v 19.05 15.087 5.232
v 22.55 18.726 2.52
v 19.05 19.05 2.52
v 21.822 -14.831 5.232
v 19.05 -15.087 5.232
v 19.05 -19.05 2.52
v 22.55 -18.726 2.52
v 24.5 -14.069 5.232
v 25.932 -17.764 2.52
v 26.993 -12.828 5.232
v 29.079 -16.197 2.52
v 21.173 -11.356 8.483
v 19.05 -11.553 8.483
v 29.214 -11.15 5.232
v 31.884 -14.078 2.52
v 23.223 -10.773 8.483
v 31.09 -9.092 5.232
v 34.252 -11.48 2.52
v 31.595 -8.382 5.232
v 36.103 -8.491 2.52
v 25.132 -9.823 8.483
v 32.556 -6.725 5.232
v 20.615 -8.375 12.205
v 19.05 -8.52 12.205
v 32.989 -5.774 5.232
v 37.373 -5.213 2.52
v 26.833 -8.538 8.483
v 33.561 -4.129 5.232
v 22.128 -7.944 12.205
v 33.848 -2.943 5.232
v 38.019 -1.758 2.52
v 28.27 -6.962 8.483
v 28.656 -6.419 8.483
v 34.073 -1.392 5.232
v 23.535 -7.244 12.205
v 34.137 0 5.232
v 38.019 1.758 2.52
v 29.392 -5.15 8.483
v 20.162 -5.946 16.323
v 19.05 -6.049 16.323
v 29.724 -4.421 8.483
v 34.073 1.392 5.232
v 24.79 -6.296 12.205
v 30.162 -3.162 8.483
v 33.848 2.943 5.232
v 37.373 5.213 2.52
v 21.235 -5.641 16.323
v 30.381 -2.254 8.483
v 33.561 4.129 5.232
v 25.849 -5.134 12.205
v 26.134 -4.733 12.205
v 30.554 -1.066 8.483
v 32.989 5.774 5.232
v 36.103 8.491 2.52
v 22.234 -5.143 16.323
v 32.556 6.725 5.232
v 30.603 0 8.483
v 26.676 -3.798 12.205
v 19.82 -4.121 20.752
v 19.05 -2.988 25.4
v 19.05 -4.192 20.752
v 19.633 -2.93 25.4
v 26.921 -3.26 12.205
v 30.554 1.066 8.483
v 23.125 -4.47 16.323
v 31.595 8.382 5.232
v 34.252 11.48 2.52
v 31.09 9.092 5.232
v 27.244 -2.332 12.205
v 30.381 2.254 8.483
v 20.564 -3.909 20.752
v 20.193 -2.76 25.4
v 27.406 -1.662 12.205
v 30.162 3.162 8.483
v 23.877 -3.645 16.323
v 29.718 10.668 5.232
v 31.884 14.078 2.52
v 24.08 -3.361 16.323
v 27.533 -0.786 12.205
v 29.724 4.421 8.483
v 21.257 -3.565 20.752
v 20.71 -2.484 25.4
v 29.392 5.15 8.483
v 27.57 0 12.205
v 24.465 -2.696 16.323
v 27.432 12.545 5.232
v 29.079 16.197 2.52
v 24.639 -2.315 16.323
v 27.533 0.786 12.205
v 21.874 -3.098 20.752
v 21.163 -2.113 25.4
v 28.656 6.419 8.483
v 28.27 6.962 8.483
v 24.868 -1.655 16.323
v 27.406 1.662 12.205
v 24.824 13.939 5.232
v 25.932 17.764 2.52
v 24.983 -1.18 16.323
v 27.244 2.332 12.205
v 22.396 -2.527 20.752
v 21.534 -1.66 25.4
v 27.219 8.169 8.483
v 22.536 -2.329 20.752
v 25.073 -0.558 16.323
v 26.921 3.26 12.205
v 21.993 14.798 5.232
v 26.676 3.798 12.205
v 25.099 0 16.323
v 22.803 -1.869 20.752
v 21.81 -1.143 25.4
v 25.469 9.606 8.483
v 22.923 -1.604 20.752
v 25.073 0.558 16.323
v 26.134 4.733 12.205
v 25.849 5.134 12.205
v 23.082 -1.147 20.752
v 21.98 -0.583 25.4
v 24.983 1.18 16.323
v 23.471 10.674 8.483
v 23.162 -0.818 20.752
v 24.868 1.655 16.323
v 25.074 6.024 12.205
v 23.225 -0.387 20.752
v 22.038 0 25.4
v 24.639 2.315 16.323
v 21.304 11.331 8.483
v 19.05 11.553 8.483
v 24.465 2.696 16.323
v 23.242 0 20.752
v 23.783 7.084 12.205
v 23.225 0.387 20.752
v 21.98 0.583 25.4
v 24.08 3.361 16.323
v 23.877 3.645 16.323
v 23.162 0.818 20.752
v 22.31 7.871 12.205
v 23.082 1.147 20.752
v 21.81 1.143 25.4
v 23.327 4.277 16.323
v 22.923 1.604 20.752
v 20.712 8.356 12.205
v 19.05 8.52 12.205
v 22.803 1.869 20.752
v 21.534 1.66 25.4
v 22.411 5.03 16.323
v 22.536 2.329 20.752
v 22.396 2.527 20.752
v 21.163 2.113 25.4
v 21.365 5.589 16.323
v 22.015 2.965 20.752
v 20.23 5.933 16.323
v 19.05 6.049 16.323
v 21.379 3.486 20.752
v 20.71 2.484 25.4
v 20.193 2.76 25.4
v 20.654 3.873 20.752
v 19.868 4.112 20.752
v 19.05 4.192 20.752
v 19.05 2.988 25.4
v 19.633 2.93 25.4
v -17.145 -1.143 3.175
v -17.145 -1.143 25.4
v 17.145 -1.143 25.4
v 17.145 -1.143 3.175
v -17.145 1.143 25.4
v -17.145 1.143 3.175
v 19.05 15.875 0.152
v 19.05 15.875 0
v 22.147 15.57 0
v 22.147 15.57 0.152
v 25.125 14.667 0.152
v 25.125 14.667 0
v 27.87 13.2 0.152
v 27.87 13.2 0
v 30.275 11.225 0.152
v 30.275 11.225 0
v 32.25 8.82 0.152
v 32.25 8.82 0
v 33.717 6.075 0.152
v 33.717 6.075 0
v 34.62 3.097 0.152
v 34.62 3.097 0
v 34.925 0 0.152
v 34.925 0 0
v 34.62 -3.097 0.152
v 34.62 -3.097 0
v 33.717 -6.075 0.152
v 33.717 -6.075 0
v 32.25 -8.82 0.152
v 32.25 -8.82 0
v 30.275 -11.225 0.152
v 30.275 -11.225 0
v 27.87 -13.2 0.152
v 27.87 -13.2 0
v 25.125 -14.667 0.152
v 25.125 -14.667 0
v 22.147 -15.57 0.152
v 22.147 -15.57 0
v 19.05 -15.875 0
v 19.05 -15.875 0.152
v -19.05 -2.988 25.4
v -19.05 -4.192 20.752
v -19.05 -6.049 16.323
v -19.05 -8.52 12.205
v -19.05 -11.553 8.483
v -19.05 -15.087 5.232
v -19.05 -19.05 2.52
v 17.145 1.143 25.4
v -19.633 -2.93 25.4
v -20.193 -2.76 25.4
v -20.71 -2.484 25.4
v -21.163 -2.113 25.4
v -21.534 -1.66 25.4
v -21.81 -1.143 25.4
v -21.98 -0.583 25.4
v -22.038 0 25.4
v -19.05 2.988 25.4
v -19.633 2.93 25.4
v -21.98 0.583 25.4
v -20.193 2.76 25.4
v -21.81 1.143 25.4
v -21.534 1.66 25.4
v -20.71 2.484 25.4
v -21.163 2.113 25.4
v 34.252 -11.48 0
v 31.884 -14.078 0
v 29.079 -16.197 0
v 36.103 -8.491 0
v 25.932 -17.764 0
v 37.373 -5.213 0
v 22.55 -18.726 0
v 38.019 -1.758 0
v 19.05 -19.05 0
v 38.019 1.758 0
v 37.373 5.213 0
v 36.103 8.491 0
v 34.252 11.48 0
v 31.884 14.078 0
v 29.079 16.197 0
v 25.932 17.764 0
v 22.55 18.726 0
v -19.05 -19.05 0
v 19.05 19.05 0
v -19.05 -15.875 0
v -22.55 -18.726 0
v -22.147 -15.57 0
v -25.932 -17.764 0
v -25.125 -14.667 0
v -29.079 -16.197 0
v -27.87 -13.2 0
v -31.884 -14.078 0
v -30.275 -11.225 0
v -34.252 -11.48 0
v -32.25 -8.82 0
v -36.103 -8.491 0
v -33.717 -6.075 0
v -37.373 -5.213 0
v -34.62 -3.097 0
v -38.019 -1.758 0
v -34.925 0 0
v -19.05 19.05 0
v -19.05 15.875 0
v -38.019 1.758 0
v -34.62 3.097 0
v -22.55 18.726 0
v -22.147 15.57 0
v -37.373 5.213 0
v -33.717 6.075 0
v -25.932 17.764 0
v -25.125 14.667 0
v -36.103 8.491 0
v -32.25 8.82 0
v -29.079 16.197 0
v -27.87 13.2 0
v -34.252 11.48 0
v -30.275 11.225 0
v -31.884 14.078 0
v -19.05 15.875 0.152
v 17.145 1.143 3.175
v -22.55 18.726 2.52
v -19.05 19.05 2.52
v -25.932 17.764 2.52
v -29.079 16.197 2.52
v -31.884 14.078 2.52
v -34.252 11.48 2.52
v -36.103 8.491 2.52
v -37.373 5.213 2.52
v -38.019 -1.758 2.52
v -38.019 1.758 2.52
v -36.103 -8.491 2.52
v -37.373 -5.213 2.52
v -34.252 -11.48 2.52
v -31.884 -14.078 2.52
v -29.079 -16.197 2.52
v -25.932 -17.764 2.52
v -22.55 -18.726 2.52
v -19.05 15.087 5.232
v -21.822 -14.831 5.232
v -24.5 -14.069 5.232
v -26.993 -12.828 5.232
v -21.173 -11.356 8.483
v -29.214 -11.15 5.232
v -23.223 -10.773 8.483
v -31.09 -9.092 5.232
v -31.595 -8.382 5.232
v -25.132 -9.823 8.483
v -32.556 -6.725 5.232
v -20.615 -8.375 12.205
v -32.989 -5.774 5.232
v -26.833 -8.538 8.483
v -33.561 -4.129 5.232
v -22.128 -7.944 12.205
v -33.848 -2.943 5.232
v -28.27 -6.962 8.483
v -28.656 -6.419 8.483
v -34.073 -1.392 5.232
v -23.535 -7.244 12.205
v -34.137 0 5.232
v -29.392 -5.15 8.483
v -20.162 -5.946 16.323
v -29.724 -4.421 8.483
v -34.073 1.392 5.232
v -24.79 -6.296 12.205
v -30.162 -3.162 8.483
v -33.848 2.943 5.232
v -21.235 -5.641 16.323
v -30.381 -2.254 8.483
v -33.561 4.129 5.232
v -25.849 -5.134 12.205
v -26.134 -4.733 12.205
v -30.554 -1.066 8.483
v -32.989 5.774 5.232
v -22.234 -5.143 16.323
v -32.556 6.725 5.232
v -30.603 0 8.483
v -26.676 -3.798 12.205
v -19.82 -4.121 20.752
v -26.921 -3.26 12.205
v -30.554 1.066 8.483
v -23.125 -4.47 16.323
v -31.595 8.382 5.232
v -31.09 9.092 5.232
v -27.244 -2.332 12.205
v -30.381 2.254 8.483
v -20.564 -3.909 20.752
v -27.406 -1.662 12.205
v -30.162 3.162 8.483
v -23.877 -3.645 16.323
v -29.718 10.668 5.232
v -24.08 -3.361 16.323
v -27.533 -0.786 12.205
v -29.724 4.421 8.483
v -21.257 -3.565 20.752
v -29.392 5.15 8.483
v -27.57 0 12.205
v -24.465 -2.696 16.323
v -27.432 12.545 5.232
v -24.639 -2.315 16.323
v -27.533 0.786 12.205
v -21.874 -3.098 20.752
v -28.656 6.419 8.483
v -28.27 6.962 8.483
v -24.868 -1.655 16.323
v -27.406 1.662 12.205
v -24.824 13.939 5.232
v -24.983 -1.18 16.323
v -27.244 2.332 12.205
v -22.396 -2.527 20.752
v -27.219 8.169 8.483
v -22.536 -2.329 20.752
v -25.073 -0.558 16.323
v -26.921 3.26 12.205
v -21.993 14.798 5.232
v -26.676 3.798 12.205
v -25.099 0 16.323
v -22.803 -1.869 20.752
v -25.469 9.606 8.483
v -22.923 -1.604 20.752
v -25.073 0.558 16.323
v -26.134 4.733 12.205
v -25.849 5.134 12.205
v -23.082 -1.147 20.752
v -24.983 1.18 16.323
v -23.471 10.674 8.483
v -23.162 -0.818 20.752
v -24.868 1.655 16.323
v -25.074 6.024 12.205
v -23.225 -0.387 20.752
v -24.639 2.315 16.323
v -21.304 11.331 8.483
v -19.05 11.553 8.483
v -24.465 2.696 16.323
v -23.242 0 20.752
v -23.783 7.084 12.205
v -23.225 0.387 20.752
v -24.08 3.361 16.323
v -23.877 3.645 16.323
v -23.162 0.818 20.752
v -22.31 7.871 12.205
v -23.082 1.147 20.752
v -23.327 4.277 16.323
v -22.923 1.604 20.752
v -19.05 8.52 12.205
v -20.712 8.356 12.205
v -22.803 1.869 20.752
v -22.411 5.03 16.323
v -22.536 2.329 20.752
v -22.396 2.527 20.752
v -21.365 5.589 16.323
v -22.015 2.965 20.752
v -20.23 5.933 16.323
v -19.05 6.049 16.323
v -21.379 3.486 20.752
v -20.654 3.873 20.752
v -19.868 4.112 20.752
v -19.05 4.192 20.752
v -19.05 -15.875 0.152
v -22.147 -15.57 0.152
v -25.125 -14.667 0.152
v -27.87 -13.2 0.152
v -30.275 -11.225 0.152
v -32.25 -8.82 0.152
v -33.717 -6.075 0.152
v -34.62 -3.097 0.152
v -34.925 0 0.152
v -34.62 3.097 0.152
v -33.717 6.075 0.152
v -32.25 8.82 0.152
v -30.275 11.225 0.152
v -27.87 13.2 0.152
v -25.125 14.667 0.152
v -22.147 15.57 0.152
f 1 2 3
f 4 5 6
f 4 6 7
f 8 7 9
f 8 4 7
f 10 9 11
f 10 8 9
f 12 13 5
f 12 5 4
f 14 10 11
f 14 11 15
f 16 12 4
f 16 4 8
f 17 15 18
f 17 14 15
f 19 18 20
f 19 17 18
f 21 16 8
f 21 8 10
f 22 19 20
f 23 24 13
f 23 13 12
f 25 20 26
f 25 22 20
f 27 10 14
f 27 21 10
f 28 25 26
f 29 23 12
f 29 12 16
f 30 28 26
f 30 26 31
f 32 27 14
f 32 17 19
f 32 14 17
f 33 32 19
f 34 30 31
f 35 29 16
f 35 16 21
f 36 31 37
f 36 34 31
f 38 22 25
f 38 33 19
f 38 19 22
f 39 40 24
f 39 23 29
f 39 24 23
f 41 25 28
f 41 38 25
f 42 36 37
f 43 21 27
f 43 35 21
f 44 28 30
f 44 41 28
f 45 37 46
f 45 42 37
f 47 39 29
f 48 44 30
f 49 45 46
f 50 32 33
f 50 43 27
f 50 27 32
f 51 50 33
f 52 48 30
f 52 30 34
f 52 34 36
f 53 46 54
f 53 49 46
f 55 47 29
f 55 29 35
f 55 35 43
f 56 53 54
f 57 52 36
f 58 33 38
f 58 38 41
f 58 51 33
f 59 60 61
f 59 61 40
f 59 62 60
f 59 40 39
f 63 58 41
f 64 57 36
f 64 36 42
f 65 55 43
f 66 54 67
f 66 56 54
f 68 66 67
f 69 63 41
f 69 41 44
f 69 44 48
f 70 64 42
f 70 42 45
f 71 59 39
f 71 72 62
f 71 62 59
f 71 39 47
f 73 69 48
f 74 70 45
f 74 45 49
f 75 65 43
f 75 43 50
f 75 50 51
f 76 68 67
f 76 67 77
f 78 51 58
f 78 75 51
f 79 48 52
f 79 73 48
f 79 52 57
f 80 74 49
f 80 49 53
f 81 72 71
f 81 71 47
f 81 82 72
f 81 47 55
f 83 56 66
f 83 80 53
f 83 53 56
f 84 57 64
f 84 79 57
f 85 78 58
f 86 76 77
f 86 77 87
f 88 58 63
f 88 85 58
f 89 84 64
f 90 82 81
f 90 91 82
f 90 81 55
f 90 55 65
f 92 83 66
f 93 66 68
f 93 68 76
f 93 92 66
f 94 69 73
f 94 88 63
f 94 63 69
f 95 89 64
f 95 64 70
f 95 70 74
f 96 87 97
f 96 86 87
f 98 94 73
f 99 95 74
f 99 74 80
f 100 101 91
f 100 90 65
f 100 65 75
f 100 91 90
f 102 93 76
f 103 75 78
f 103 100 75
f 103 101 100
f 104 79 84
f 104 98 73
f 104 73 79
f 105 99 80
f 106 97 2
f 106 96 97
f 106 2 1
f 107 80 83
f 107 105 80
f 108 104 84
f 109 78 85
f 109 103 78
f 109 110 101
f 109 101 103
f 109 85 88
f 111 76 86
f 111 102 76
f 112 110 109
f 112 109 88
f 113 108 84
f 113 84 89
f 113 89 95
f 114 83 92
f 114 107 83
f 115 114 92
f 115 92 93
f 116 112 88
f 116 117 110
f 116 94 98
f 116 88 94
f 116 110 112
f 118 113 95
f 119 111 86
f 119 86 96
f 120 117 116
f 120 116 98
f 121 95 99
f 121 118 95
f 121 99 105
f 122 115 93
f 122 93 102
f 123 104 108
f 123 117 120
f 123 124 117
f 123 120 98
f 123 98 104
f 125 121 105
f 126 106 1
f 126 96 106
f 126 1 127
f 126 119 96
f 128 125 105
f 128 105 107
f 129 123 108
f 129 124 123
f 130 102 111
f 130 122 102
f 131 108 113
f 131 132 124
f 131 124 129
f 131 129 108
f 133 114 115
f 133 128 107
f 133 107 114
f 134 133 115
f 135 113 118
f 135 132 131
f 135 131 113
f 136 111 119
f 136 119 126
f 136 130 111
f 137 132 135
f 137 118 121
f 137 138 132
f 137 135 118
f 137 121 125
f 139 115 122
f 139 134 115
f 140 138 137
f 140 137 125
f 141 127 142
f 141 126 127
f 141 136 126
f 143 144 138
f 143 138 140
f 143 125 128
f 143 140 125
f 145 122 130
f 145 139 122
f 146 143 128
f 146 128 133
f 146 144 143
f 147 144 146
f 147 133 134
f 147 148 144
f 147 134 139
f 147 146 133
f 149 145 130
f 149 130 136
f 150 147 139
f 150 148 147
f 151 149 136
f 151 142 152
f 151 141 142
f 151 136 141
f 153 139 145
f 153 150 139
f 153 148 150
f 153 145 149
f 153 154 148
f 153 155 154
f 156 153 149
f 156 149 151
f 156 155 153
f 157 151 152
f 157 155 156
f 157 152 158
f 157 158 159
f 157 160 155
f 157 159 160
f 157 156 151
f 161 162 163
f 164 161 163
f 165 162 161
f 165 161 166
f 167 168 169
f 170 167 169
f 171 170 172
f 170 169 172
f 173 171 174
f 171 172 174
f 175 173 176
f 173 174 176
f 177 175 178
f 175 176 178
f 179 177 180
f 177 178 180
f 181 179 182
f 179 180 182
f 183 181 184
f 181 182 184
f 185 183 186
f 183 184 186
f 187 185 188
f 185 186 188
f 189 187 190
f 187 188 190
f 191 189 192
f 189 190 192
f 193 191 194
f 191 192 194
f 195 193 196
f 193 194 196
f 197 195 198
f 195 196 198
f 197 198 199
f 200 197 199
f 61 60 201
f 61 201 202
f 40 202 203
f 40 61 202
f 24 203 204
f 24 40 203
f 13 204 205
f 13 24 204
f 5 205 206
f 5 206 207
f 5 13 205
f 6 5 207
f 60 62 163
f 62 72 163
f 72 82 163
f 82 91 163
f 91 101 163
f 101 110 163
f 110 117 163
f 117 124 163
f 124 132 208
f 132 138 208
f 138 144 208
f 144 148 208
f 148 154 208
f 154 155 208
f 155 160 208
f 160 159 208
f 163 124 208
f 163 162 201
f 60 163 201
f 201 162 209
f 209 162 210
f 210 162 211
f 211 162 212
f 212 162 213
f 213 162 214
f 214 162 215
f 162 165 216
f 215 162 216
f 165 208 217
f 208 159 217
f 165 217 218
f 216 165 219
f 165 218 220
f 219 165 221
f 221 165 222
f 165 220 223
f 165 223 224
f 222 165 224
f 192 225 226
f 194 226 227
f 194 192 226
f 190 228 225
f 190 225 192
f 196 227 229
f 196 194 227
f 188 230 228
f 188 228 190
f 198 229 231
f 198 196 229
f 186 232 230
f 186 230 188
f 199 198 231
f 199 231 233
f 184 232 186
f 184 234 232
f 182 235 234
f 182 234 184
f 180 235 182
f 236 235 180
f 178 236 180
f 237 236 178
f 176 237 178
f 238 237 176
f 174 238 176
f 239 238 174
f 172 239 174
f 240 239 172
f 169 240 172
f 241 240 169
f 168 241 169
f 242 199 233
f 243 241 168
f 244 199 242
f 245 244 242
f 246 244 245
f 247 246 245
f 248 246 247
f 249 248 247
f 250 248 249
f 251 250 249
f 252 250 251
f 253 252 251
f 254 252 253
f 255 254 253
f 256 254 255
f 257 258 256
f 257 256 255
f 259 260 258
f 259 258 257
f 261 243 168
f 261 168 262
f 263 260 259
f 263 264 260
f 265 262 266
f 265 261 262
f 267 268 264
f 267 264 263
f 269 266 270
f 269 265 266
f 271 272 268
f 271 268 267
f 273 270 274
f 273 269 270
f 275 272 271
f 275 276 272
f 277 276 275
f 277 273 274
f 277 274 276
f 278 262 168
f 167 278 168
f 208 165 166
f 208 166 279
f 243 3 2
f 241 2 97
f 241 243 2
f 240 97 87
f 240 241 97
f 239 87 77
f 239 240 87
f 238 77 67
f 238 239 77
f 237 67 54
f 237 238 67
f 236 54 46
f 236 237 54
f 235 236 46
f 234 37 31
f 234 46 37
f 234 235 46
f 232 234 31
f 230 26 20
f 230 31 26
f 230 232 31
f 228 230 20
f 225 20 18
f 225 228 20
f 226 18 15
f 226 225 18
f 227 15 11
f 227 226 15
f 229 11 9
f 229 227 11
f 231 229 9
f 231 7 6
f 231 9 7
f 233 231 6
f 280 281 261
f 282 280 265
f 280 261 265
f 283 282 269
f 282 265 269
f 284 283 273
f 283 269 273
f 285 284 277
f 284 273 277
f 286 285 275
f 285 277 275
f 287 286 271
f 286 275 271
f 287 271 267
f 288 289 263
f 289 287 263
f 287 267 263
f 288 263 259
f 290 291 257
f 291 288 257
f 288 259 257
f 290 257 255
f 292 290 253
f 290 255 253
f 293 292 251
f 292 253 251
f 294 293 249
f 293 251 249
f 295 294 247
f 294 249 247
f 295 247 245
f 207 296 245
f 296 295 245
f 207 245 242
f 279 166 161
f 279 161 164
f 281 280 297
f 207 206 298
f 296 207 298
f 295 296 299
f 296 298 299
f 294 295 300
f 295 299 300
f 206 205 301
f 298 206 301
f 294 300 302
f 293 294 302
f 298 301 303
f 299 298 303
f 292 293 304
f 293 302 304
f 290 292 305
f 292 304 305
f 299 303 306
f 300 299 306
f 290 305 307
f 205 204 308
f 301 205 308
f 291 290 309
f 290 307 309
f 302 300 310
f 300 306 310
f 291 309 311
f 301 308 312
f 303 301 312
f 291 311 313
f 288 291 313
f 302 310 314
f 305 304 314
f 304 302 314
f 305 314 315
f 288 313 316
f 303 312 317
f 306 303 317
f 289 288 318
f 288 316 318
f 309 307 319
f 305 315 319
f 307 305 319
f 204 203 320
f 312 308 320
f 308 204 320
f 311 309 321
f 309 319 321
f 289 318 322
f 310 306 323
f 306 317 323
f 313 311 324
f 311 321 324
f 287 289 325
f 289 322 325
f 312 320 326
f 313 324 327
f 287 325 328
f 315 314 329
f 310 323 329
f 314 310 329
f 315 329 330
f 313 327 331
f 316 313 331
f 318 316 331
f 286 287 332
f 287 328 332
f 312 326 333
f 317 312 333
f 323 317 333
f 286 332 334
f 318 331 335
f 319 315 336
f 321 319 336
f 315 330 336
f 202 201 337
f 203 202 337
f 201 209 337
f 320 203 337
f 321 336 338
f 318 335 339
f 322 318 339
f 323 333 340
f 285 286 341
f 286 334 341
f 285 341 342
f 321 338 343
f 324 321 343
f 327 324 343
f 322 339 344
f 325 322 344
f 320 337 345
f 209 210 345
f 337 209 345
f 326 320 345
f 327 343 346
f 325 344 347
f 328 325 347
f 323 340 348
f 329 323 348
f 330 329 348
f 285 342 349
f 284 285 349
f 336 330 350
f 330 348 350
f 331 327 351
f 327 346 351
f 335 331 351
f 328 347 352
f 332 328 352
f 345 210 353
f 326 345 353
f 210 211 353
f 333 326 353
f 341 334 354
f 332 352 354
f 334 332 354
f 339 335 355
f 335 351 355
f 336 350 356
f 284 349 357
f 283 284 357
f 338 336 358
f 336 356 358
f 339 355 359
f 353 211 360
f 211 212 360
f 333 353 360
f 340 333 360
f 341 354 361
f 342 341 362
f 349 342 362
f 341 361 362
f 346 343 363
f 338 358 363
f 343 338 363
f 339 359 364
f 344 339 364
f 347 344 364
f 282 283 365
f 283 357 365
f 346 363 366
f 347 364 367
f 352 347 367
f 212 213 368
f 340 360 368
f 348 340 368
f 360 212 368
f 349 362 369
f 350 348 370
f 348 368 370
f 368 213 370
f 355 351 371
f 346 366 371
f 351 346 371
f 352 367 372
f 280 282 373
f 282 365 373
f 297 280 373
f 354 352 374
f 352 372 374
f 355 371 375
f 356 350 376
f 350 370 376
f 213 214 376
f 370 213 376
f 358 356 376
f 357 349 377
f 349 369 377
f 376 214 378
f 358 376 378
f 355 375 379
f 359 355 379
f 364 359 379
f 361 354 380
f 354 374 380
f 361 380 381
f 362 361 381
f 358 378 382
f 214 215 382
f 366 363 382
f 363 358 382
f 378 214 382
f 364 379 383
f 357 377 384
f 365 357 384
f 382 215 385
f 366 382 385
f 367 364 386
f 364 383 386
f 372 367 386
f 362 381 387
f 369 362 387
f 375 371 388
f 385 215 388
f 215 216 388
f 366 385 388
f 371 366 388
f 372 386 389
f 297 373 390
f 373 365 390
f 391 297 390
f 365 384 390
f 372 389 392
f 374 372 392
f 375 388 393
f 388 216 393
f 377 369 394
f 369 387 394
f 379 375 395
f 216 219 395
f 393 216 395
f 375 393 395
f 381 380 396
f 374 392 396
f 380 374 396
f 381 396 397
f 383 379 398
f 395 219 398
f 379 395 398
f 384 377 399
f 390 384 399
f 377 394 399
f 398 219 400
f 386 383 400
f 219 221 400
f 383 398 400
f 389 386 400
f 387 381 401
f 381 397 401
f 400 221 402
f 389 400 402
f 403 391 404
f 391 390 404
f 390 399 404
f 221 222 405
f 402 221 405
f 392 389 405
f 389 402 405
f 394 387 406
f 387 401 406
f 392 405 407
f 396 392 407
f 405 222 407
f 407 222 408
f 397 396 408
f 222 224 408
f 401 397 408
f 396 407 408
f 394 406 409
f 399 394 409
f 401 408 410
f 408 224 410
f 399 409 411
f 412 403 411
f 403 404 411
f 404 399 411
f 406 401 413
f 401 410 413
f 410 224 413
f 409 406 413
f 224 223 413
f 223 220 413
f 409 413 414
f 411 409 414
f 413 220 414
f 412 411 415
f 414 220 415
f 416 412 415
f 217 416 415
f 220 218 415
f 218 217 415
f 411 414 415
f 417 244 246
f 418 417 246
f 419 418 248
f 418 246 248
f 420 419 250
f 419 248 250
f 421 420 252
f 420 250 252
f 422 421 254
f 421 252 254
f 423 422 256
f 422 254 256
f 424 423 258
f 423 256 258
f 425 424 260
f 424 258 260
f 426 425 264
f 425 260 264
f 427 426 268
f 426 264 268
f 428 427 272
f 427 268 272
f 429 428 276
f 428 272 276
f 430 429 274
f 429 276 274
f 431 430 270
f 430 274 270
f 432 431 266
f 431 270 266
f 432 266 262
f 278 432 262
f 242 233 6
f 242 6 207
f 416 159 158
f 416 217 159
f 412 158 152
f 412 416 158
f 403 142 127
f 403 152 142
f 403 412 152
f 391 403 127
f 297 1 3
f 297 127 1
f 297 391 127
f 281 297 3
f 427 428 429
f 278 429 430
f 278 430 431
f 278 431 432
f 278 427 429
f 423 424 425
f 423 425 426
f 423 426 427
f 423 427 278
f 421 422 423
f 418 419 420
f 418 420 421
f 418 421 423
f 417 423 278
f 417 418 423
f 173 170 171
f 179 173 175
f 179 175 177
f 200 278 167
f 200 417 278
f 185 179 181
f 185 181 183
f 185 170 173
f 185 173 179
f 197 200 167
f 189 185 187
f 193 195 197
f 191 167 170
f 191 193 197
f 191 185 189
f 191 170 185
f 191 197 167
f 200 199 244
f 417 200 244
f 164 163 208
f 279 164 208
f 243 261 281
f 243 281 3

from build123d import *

# Parameters (mm, degrees)
F1_DEPTH = 25.4
F2_R     = 33.5189811659
F5_W     = 34.29
F5_H     = 2.286
F6_DEPTH = 22.225
F8_DEPTH = 0.1524


with BuildPart() as f1:
    # F0 (on Top) → F1 (new body)
    with BuildSketch(Plane.XY):
        with BuildLine():
            Line((0, -19.05), (0, 19.05))
            Line((0, 19.05), (-19.05, 19.05))
            ThreePointArc((-19.05, 19.05), (-38.1, 0), (-19.05, -19.05))
            Line((-19.05, -19.05), (0, -19.05))
        make_face()
    extrude(amount=F1_DEPTH)

    # F3: sweep along a path in F3_path
    with BuildLine(Plane(origin=(-19.05, -19.05, 25.4), x_dir=(0, 1, 0), z_dir=(0, 0, 1))) as f3_path:
        Line((0, -19.05), (0, 0))
        ThreePointArc((0, 0), (19.05, 19.05), (38.1, 0))
        Line((38.1, 0), (38.1, -19.05))
    # F2 (on Right) → F3 (sweep, cut)
    with BuildSketch(Plane.YZ):
        with Locations((-35.9534211457, 31.4643979073)):
            Circle(F2_R)
    sweep(path=f3_path.line, mode=Mode.SUBTRACT)

    # F4: F1 across face


with BuildPart() as f1_1:
    add(f1.part)
    add(f1.part.mirror(Plane(origin=(0, 0, 8.7269001071), x_dir=(0, 1, 0), z_dir=(1, 0, 0))))

    # F5 (on face) → F6 (cut)
    with BuildSketch(Plane.XY.offset(25.4)):
        Rectangle(F5_W, F5_H)
    extrude(amount=-F6_DEPTH, mode=Mode.SUBTRACT)

    # F7 (on face) → F8 (cut)
    with BuildSketch(Plane(origin=(0, 0, 0), x_dir=(1, 0, 0), z_dir=(0, 0, -1))):
        with BuildLine():
            ThreePointArc((19.05, -15.875), (34.925, 0), (19.05, 15.875))
            Line((19.05, 15.875), (-19.05, 15.875))
            ThreePointArc((-19.05, 15.875), (-34.925, 0), (-19.05, -15.875))
            Line((-19.05, -15.875), (19.05, -15.875))
        make_face()
    extrude(amount=-F8_DEPTH, mode=Mode.SUBTRACT)


solid = f1_1.part
